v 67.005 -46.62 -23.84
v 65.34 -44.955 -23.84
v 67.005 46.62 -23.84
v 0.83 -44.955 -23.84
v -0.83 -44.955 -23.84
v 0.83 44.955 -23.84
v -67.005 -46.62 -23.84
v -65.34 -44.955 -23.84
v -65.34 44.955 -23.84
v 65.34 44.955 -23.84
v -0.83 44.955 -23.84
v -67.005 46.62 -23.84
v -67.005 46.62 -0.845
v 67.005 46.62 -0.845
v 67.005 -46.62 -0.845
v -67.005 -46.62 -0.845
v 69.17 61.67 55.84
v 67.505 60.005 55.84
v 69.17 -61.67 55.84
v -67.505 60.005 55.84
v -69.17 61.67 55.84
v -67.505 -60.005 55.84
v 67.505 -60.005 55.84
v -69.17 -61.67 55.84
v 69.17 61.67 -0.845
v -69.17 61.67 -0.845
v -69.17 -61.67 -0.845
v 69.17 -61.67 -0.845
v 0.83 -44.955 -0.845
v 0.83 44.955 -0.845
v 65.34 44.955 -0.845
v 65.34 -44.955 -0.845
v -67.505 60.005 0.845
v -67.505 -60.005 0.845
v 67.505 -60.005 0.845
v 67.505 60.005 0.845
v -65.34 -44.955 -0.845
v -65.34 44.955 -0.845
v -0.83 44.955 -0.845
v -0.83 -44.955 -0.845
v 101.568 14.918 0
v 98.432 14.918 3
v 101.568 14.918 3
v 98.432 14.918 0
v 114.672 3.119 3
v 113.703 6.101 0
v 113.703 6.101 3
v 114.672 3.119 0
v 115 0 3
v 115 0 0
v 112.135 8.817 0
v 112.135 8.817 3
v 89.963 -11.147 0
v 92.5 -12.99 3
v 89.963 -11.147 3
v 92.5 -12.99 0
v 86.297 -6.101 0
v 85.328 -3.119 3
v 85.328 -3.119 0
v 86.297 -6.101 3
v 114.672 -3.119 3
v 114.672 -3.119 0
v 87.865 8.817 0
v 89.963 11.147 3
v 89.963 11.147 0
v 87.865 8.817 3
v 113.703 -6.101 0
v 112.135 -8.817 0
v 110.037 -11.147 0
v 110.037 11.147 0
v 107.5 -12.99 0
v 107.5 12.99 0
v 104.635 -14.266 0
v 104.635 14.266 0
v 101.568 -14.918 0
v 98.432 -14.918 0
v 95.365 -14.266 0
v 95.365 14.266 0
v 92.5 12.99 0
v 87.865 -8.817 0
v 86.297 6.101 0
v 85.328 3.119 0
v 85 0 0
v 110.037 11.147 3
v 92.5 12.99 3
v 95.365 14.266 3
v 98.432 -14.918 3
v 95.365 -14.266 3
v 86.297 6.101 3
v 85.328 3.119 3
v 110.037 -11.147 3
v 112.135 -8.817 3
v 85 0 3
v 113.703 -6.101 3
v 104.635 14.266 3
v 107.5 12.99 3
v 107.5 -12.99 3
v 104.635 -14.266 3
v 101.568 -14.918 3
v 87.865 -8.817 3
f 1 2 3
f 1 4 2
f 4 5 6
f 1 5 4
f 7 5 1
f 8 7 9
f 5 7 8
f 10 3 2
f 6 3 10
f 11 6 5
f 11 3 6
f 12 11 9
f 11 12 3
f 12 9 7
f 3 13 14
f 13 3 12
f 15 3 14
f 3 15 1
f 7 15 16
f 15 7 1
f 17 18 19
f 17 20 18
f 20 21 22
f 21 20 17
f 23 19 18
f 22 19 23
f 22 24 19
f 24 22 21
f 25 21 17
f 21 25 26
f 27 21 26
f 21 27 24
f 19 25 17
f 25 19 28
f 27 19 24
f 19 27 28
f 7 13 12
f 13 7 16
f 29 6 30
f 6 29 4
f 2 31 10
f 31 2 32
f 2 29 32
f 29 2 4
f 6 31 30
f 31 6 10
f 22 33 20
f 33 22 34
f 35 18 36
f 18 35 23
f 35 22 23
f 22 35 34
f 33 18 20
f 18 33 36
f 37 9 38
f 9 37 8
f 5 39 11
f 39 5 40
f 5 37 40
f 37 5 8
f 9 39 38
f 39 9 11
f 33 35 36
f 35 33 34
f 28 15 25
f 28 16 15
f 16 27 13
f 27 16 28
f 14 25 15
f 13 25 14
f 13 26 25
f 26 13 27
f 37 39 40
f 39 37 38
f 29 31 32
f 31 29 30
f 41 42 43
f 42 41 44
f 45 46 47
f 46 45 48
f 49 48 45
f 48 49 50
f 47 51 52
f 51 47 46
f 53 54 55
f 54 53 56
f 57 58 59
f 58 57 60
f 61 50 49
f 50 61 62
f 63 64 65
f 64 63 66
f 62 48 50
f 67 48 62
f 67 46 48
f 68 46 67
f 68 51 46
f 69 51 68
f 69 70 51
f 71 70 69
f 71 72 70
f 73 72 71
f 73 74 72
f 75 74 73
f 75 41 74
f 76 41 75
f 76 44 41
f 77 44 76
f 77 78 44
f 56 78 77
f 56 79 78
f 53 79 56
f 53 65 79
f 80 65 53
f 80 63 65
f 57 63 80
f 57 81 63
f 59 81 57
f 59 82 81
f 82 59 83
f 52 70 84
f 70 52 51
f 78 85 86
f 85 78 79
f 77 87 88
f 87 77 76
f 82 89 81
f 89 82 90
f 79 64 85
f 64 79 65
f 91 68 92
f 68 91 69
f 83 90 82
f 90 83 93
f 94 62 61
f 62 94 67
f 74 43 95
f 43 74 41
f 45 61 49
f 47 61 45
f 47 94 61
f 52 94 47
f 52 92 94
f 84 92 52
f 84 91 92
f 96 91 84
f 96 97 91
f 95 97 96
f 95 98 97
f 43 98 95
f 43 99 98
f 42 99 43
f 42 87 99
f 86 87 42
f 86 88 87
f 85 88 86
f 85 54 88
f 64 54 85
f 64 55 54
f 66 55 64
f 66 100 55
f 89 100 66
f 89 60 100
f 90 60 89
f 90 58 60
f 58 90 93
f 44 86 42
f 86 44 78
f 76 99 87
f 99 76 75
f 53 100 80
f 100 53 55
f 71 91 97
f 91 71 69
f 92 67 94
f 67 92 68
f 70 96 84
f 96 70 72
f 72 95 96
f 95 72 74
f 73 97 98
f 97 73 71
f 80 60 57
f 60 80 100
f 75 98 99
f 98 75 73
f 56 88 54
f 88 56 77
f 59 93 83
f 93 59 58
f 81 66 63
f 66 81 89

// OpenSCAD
cards_x = 2.5*25.4+1;
cards_y = 3.5*25.4+1;
cards_z=20+3;
twt = 1.67;
d_token = 30;
burrito_x = 135;
burrito_y = 120;
burrito_z = 55;
module voids(){
	translate([0,0,0])
	translate([0,0,(burrito_z+twt)/2])
		cube([burrito_x, burrito_y, burrito_z], center=true);
	translate([-(cards_x+twt)/2,0,-(cards_z+twt)/2])
		cube([cards_x, cards_y, cards_z], center=true);
	translate([(cards_x+twt)/2,0,-(cards_z+twt)/2])
		cube([cards_x, cards_y, cards_z], center=true);
}



cube([burrito_x+2*twt, burrito_y+2*twt, twt + .02], center=true);
difference(convexity=20){
	minkowski(convexity=20){
		voids();
		cube([2*twt,2*twt,.01], center=true);
	}
	minkowski(convexity=20){
		voids();
		cube([.01,.01,.02], center=true);
	}
}


translate([100,0,0]) cylinder(d=d_token,h=3);
